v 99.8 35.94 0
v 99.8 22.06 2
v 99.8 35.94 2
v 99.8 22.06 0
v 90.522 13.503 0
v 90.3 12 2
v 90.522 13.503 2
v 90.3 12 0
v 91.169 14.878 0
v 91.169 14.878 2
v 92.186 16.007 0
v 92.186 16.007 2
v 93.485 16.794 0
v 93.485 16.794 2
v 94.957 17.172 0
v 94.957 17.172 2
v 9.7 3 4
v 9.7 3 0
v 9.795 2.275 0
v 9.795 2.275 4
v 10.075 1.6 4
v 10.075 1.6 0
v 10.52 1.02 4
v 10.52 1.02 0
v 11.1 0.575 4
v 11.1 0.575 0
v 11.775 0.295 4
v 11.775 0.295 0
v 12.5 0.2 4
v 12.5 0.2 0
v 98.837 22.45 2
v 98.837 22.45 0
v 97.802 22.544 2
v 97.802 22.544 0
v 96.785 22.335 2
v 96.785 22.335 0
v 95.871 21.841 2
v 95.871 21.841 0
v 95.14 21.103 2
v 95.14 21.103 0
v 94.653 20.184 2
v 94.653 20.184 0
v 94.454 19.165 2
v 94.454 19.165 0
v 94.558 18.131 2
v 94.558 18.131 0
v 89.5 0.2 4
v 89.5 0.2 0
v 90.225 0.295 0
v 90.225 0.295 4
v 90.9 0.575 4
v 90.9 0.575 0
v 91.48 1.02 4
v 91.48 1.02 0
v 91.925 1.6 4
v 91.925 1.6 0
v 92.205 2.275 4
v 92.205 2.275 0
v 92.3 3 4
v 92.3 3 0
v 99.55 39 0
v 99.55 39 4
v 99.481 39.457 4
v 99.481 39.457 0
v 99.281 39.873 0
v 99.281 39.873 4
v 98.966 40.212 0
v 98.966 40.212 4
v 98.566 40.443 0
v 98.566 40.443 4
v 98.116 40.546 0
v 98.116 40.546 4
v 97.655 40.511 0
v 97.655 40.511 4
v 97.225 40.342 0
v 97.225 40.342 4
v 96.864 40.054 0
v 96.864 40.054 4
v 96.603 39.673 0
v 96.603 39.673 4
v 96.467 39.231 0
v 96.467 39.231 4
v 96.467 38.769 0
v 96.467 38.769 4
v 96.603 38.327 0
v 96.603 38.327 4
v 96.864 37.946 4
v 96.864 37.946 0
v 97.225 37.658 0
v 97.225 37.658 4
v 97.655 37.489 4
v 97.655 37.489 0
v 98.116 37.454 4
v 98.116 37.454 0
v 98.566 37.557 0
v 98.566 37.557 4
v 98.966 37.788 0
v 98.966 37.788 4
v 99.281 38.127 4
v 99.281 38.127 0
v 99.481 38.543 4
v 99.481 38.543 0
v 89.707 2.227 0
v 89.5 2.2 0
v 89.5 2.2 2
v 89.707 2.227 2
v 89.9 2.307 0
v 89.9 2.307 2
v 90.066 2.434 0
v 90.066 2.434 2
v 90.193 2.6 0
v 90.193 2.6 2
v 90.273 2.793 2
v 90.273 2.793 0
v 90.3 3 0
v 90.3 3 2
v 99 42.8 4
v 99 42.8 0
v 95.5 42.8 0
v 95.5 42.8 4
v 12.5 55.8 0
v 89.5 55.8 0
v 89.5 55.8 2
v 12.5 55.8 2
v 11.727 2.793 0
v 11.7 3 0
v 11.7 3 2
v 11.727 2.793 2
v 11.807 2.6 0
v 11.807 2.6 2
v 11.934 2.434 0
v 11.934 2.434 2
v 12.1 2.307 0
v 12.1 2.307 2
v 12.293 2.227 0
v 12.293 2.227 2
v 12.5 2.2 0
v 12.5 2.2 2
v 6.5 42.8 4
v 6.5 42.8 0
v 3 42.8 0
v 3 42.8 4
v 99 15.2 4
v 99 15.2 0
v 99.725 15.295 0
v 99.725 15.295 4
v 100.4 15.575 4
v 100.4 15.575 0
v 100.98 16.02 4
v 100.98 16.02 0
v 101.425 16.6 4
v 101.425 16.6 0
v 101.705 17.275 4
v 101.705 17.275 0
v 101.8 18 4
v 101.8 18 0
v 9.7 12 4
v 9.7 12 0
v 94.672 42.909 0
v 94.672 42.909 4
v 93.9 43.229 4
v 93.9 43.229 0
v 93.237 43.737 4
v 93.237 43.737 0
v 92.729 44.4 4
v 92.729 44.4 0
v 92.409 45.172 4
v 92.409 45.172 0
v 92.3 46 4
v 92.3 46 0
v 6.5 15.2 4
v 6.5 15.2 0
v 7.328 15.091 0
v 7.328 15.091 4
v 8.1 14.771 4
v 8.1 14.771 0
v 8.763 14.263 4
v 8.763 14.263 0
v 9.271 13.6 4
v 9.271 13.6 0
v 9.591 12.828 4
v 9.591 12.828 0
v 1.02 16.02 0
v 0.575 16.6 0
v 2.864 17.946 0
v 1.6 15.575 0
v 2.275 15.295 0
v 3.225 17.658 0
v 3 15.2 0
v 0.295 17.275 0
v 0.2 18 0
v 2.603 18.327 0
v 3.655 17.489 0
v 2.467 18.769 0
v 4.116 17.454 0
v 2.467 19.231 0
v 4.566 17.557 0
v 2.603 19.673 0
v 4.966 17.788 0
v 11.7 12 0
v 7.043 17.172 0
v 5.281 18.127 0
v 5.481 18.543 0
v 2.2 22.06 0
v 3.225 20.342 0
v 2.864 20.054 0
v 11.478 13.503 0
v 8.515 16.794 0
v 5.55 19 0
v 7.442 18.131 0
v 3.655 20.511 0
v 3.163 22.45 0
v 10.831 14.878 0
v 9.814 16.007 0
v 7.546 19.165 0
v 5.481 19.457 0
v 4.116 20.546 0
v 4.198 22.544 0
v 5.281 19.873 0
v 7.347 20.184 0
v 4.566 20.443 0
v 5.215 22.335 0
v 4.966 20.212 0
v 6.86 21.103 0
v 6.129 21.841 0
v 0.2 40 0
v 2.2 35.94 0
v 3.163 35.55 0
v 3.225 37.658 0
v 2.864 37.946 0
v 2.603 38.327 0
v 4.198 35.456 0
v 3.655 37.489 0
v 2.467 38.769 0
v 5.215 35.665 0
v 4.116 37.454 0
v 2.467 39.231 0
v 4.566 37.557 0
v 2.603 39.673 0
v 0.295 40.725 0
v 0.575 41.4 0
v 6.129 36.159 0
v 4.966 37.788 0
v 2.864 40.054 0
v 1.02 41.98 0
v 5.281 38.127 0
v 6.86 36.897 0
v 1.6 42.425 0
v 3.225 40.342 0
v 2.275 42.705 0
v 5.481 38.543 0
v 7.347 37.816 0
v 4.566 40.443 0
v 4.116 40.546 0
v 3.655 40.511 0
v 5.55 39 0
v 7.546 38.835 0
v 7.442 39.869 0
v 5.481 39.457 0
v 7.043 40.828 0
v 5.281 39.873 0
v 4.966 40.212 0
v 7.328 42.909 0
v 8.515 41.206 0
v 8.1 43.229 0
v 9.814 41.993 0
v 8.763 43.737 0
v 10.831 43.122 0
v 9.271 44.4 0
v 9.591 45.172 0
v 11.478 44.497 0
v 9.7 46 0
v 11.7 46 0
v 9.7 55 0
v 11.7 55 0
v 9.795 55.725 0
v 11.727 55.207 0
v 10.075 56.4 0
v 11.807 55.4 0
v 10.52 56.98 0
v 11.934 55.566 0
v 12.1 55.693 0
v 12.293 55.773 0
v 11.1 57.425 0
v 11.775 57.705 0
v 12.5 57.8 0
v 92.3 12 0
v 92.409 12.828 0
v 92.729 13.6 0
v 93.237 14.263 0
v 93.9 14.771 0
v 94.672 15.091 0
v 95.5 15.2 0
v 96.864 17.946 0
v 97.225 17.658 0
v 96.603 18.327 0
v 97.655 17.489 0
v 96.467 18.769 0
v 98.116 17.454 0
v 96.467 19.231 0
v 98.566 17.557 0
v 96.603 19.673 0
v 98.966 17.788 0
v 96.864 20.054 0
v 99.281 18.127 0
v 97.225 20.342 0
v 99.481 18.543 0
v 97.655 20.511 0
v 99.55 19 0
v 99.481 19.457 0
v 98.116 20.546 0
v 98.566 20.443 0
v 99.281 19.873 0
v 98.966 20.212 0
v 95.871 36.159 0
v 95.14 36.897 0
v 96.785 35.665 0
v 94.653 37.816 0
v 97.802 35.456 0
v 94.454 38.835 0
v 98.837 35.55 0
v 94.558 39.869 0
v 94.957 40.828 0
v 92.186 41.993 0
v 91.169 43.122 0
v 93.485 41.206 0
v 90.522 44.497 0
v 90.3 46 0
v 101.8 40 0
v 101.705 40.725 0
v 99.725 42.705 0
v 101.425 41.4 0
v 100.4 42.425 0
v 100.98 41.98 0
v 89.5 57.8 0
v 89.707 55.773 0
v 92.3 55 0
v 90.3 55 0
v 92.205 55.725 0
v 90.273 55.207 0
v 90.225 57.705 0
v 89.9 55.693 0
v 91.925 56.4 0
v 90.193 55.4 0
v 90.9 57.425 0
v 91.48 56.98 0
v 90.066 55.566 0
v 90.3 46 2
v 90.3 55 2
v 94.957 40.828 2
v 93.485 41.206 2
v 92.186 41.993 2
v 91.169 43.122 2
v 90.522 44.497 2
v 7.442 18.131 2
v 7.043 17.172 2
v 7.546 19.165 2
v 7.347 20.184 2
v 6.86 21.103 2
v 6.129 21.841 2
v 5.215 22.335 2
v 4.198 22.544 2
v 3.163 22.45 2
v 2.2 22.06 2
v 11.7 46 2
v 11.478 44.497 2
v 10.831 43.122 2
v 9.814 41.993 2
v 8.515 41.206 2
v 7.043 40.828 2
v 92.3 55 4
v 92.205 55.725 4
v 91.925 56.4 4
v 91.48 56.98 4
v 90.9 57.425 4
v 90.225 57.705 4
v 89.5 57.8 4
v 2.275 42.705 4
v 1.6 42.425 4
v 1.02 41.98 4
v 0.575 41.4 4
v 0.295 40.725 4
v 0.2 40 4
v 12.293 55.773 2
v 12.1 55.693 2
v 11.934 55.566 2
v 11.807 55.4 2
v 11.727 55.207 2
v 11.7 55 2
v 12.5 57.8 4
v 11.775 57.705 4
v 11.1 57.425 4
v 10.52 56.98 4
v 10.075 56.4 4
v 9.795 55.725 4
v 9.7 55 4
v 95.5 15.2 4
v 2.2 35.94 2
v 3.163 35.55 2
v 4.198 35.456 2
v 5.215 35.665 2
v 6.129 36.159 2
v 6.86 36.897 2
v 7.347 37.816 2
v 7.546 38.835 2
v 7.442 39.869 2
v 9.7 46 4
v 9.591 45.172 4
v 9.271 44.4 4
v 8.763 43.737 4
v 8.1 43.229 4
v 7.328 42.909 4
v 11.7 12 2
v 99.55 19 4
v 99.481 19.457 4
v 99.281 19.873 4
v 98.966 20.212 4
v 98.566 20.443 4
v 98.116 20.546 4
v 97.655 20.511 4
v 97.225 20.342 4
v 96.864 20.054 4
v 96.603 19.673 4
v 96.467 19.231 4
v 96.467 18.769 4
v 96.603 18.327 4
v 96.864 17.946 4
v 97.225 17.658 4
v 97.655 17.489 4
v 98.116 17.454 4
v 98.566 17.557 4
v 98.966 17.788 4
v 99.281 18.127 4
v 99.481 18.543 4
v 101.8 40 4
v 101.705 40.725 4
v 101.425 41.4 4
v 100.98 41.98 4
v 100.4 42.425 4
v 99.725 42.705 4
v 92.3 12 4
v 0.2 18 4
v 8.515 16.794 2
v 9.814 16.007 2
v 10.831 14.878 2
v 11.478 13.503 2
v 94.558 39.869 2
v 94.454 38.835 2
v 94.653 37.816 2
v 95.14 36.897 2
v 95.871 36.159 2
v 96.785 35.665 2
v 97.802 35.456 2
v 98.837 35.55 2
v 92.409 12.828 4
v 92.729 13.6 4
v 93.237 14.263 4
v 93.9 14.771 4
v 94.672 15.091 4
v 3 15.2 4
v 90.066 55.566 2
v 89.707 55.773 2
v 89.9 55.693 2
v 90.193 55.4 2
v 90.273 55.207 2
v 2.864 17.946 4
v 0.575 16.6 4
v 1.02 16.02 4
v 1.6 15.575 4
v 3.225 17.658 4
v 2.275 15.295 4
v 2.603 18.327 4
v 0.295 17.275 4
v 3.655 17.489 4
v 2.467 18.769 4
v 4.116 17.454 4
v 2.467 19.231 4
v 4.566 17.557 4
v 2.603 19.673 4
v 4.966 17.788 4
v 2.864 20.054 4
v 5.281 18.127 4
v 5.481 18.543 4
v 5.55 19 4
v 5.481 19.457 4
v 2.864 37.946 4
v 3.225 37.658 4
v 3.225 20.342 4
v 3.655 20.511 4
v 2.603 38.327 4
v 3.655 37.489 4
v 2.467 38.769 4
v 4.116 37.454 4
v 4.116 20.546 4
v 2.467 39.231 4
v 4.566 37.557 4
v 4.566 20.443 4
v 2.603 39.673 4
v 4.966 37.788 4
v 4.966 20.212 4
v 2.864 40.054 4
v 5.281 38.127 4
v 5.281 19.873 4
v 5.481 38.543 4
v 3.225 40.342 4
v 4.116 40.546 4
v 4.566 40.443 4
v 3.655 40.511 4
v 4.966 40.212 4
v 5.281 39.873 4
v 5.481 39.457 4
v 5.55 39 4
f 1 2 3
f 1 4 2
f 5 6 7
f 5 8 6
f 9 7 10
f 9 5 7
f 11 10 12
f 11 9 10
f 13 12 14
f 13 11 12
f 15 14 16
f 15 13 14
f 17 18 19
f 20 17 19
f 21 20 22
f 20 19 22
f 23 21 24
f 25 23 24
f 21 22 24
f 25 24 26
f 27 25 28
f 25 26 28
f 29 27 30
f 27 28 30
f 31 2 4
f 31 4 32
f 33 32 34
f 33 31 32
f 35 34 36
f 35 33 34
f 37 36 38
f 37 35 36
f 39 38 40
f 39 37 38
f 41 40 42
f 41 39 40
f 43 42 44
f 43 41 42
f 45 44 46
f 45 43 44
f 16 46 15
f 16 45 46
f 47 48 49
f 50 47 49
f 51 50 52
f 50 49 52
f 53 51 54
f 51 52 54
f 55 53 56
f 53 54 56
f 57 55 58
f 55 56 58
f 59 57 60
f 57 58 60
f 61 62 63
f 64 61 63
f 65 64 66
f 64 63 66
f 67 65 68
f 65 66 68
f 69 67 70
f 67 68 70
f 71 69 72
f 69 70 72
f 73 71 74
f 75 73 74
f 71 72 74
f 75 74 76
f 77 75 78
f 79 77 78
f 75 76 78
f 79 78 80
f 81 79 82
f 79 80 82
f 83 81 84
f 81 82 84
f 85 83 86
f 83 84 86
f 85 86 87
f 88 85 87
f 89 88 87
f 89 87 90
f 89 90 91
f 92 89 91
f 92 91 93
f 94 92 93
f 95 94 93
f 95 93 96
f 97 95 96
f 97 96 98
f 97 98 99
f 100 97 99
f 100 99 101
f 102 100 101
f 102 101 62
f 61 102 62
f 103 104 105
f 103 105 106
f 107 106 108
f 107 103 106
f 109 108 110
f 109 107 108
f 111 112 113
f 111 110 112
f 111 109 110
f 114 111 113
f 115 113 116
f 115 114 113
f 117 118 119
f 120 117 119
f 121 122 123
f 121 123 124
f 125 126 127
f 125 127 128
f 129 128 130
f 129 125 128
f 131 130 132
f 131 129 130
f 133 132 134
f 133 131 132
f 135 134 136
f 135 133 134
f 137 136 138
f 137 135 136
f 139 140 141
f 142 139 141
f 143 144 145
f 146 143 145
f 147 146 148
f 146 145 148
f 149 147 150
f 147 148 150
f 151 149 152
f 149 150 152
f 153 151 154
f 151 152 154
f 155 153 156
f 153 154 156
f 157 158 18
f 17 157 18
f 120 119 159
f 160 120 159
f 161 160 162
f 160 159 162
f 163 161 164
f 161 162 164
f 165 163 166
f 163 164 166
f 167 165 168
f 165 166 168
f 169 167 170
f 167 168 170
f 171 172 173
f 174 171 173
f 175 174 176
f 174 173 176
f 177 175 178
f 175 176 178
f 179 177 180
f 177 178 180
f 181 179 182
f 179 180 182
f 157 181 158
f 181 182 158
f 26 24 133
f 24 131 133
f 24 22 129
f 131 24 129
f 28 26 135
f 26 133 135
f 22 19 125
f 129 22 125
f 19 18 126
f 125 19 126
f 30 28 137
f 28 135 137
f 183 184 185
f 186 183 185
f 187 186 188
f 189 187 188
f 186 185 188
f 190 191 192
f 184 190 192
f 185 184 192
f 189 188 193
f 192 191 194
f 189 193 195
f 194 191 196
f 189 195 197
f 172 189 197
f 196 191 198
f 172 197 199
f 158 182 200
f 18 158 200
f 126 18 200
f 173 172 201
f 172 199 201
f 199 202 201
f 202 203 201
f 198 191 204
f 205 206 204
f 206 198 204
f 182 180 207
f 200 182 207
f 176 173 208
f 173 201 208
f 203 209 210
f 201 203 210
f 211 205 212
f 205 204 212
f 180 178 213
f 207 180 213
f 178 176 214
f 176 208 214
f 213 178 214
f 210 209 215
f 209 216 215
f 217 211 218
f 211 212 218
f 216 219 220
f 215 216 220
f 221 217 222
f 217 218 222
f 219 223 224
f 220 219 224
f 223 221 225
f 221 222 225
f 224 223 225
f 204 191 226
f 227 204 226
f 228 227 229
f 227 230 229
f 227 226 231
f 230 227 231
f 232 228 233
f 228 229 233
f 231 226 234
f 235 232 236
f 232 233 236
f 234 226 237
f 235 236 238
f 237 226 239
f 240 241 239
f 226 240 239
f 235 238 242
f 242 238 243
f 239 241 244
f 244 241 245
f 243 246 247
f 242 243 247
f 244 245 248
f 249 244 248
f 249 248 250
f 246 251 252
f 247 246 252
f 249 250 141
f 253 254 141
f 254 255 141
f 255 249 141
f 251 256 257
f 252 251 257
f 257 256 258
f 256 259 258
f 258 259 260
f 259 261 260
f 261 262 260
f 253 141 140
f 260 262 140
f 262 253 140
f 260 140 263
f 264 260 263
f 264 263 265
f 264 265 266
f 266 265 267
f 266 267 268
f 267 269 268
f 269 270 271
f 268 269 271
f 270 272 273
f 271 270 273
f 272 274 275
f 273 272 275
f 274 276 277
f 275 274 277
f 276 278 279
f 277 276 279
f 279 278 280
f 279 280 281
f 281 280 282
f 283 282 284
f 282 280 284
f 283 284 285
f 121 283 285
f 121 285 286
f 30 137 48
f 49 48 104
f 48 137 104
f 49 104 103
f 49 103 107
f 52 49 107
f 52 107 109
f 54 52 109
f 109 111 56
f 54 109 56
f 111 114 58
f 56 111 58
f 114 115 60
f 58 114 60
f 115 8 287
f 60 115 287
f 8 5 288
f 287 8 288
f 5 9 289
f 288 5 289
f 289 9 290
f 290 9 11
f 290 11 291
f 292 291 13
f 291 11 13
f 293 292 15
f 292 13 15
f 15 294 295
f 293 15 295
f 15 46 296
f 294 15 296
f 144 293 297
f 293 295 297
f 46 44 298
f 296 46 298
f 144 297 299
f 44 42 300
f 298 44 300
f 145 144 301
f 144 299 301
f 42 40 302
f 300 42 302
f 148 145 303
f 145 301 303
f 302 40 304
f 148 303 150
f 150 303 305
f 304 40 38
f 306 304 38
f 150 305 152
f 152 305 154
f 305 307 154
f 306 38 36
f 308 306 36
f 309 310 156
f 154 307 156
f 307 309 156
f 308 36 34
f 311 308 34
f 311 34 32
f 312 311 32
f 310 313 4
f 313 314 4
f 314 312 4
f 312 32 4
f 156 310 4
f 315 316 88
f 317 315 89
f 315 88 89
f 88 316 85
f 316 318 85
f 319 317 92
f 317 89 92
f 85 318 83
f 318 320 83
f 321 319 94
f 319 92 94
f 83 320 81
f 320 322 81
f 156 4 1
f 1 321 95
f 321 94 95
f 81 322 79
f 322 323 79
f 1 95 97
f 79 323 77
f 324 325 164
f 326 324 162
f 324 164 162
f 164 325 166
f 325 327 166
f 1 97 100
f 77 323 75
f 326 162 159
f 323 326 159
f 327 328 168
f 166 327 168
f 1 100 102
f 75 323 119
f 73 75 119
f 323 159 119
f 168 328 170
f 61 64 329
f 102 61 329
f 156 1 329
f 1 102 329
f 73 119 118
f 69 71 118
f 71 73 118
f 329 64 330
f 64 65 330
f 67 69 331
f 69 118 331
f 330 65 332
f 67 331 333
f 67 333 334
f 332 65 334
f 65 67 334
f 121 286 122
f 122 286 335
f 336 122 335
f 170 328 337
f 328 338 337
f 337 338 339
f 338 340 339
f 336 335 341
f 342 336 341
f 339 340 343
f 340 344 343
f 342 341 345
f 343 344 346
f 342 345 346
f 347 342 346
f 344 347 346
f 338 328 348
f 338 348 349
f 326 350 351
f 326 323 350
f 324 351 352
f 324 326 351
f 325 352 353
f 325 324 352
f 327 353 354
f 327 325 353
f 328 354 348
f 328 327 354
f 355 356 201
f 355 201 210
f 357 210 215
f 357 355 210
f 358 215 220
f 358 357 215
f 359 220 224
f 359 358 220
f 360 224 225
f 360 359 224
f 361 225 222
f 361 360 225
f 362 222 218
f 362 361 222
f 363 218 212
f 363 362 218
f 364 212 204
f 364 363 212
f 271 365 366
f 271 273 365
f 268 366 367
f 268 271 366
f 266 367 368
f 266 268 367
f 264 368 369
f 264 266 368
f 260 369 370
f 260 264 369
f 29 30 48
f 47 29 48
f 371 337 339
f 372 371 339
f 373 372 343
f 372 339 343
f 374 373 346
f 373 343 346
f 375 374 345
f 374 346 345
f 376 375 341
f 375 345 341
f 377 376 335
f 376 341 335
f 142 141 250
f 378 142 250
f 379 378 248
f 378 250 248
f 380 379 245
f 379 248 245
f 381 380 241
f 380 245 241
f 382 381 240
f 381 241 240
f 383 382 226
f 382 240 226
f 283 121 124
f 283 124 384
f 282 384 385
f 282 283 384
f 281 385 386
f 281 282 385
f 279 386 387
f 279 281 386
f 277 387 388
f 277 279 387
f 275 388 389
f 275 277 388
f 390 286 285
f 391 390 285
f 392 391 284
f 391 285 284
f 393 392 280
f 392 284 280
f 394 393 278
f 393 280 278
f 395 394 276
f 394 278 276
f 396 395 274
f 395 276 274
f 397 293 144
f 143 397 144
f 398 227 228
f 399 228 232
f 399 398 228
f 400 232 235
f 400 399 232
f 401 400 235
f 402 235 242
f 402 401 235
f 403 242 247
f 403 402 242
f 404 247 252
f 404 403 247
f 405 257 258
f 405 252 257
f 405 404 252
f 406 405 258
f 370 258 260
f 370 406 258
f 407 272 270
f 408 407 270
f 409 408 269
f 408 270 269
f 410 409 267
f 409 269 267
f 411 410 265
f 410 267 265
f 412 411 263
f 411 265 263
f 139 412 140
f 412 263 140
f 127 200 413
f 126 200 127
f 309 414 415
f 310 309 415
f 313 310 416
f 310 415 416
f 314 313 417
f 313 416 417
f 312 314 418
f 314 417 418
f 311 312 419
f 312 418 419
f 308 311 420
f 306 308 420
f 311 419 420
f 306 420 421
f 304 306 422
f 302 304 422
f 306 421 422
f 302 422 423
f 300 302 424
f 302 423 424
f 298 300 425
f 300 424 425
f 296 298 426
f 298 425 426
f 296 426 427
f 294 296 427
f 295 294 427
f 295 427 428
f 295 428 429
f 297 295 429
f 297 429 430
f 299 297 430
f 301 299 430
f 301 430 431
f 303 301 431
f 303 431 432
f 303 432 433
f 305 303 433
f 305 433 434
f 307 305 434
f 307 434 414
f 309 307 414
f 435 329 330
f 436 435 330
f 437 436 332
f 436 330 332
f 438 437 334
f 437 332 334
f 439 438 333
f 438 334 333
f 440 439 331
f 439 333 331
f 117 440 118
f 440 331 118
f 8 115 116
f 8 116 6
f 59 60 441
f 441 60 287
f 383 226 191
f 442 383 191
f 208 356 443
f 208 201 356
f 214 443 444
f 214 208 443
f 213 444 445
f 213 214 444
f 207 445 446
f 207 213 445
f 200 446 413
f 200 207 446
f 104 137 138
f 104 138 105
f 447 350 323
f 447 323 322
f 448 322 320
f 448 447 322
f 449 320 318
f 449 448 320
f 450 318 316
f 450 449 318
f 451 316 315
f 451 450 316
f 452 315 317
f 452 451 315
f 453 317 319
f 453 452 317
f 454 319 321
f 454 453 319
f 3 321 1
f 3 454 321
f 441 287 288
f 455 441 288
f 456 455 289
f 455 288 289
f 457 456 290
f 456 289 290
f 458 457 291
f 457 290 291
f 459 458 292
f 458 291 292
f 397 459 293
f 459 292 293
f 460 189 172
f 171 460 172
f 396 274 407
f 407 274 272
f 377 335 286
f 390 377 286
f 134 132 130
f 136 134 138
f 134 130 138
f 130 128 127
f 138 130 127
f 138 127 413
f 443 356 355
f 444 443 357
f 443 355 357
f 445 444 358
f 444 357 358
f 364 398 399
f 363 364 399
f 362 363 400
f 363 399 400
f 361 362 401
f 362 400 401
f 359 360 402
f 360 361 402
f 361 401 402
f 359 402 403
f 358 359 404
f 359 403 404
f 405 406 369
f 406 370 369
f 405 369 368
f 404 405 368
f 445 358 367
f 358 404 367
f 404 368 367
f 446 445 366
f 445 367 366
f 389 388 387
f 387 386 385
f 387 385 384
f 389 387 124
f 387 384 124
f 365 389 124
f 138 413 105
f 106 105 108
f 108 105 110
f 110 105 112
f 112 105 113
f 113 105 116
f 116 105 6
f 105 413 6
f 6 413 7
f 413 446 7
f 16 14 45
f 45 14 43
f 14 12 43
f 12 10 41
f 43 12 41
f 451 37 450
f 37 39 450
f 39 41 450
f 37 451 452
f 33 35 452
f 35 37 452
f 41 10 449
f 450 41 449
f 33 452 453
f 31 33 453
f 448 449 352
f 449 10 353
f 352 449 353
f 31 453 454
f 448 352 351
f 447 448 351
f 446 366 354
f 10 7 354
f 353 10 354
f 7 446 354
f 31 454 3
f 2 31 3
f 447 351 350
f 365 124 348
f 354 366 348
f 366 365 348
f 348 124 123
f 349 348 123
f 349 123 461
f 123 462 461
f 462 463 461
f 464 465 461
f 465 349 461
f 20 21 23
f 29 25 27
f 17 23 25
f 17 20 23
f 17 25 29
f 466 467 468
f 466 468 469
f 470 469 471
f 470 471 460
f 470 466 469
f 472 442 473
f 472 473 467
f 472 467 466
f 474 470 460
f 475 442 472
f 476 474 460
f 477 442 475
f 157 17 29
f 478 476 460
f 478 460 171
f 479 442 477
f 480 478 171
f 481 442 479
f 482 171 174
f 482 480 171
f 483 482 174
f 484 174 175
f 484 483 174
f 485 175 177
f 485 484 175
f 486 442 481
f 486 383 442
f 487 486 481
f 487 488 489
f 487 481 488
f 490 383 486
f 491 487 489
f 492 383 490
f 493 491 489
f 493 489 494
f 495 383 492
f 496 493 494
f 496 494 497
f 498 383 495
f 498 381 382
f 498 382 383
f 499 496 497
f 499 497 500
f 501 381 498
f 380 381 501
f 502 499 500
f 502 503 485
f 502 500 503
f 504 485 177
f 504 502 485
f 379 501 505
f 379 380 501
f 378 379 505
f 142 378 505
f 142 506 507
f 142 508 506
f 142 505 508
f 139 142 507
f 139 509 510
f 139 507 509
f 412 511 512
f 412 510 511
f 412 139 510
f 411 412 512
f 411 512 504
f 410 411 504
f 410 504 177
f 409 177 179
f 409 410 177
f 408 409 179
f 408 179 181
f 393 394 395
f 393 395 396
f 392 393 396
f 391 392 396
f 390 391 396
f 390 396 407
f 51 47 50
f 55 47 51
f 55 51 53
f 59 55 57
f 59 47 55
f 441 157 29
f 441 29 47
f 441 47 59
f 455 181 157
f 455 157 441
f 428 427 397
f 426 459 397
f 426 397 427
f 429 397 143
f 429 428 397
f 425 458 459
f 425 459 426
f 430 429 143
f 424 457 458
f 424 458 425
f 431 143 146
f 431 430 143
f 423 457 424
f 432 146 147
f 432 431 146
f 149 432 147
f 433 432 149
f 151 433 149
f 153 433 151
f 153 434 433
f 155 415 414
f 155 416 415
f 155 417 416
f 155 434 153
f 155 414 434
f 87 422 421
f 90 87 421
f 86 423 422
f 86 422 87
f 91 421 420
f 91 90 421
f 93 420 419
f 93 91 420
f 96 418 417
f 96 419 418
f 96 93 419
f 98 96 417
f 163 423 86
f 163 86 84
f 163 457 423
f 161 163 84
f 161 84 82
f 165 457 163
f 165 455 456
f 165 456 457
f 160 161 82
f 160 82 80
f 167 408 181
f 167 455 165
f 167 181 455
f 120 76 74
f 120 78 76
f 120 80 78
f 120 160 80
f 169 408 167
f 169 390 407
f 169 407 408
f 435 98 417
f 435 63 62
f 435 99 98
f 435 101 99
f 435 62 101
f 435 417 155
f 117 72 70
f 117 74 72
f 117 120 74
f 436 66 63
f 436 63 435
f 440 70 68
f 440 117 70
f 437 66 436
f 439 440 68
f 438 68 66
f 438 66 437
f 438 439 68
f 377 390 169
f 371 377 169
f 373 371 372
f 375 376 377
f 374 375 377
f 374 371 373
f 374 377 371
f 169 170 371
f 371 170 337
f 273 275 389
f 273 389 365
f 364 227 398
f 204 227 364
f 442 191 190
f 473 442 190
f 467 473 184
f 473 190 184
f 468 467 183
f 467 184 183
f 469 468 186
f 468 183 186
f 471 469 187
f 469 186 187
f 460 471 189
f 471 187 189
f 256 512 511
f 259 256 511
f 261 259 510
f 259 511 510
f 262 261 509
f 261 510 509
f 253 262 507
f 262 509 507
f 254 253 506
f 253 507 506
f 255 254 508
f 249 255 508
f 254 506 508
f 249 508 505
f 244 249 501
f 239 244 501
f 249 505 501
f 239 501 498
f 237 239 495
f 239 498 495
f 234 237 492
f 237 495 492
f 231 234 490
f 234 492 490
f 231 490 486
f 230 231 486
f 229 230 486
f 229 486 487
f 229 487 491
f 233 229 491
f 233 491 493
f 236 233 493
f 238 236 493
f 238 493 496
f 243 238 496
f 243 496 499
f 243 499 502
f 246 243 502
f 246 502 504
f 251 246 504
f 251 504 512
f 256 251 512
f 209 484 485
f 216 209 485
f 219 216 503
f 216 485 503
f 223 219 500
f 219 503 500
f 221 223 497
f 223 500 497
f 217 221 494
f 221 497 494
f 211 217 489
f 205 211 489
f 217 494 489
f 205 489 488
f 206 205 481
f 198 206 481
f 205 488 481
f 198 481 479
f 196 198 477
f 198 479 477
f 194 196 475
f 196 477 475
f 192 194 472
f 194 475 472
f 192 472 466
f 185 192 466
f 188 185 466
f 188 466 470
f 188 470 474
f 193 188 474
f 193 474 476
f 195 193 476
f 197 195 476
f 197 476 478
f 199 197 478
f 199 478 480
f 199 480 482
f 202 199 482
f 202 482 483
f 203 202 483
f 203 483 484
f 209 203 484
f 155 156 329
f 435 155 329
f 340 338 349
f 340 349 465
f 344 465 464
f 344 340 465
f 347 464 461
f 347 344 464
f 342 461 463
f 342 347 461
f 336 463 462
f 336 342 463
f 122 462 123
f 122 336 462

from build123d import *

# Parameters (mm, degrees)
EXTRUDE_1_DEPTH     = 4
SKETCH_3_R          = 1.55
CUT_EXTRUDE_1_DEPTH = 118.132745208
SHELL_1_T           = -2


with BuildPart() as part:
    # 草图1 → 凸台-拉伸1 (new body)
    with BuildSketch(Plane.XY):
        with BuildLine():
            Line((0.2, 40), (0.2, 18))
            ThreePointArc((0.2, 18), (1.020101013, 16.020101013), (3, 15.2))
            Line((3, 15.2), (6.5, 15.2))
            ThreePointArc((6.5, 15.2), (8.7627417, 14.2627417), (9.7, 12))
            Line((9.7, 12), (9.7, 3))
            ThreePointArc((9.7, 3), (10.520101013, 1.020101013), (12.5, 0.2))
            Line((12.5, 0.2), (89.5, 0.2))
            ThreePointArc((89.5, 0.2), (91.479898987, 1.020101013), (92.3, 3))
            Line((92.3, 3), (92.3, 12))
            ThreePointArc((92.3, 12), (93.2372583, 14.2627417), (95.5, 15.2))
            Line((95.5, 15.2), (99, 15.2))
            ThreePointArc((99, 15.2), (100.979898987, 16.020101013), (101.8, 18))
            Line((101.8, 18), (101.8, 40))
            ThreePointArc((101.8, 40), (100.979898987, 41.979898987), (99, 42.8))
            Line((99, 42.8), (95.5, 42.8))
            ThreePointArc((95.5, 42.8), (93.2372583, 43.7372583), (92.3, 46))
            Line((92.3, 46), (92.3, 55))
            ThreePointArc((92.3, 55), (91.479898987, 56.979898987), (89.5, 57.8))
            Line((89.5, 57.8), (12.5, 57.8))
            ThreePointArc((12.5, 57.8), (10.520101013, 56.979898987), (9.7, 55))
            Line((9.7, 55), (9.7, 46))
            ThreePointArc((9.7, 46), (8.7627417, 43.7372583), (6.5, 42.8))
            Line((6.5, 42.8), (3, 42.8))
            ThreePointArc((3, 42.8), (1.020101013, 41.979898987), (0.2, 40))
        make_face()
    extrude(amount=EXTRUDE_1_DEPTH)

    # 草图3 → 切除-拉伸1 (cut, through all)
    with BuildSketch(Plane.XY.offset(4)):
        with Locations((4, 39)):
            Circle(SKETCH_3_R)
        with Locations((4, 19)):
            Circle(SKETCH_3_R)
        with Locations((98, 39)):
            Circle(SKETCH_3_R)
        with Locations((98, 19)):
            Circle(SKETCH_3_R)
    extrude(amount=-CUT_EXTRUDE_1_DEPTH, mode=Mode.SUBTRACT)

    # 抽壳1
    shell_1_openings = [part.faces().sort_by_distance(p)[0] for p in [
        (51, 29, 0),
    ]]
    offset(amount=SHELL_1_T, openings=shell_1_openings, kind=Kind.INTERSECTION)


solid = part.part
